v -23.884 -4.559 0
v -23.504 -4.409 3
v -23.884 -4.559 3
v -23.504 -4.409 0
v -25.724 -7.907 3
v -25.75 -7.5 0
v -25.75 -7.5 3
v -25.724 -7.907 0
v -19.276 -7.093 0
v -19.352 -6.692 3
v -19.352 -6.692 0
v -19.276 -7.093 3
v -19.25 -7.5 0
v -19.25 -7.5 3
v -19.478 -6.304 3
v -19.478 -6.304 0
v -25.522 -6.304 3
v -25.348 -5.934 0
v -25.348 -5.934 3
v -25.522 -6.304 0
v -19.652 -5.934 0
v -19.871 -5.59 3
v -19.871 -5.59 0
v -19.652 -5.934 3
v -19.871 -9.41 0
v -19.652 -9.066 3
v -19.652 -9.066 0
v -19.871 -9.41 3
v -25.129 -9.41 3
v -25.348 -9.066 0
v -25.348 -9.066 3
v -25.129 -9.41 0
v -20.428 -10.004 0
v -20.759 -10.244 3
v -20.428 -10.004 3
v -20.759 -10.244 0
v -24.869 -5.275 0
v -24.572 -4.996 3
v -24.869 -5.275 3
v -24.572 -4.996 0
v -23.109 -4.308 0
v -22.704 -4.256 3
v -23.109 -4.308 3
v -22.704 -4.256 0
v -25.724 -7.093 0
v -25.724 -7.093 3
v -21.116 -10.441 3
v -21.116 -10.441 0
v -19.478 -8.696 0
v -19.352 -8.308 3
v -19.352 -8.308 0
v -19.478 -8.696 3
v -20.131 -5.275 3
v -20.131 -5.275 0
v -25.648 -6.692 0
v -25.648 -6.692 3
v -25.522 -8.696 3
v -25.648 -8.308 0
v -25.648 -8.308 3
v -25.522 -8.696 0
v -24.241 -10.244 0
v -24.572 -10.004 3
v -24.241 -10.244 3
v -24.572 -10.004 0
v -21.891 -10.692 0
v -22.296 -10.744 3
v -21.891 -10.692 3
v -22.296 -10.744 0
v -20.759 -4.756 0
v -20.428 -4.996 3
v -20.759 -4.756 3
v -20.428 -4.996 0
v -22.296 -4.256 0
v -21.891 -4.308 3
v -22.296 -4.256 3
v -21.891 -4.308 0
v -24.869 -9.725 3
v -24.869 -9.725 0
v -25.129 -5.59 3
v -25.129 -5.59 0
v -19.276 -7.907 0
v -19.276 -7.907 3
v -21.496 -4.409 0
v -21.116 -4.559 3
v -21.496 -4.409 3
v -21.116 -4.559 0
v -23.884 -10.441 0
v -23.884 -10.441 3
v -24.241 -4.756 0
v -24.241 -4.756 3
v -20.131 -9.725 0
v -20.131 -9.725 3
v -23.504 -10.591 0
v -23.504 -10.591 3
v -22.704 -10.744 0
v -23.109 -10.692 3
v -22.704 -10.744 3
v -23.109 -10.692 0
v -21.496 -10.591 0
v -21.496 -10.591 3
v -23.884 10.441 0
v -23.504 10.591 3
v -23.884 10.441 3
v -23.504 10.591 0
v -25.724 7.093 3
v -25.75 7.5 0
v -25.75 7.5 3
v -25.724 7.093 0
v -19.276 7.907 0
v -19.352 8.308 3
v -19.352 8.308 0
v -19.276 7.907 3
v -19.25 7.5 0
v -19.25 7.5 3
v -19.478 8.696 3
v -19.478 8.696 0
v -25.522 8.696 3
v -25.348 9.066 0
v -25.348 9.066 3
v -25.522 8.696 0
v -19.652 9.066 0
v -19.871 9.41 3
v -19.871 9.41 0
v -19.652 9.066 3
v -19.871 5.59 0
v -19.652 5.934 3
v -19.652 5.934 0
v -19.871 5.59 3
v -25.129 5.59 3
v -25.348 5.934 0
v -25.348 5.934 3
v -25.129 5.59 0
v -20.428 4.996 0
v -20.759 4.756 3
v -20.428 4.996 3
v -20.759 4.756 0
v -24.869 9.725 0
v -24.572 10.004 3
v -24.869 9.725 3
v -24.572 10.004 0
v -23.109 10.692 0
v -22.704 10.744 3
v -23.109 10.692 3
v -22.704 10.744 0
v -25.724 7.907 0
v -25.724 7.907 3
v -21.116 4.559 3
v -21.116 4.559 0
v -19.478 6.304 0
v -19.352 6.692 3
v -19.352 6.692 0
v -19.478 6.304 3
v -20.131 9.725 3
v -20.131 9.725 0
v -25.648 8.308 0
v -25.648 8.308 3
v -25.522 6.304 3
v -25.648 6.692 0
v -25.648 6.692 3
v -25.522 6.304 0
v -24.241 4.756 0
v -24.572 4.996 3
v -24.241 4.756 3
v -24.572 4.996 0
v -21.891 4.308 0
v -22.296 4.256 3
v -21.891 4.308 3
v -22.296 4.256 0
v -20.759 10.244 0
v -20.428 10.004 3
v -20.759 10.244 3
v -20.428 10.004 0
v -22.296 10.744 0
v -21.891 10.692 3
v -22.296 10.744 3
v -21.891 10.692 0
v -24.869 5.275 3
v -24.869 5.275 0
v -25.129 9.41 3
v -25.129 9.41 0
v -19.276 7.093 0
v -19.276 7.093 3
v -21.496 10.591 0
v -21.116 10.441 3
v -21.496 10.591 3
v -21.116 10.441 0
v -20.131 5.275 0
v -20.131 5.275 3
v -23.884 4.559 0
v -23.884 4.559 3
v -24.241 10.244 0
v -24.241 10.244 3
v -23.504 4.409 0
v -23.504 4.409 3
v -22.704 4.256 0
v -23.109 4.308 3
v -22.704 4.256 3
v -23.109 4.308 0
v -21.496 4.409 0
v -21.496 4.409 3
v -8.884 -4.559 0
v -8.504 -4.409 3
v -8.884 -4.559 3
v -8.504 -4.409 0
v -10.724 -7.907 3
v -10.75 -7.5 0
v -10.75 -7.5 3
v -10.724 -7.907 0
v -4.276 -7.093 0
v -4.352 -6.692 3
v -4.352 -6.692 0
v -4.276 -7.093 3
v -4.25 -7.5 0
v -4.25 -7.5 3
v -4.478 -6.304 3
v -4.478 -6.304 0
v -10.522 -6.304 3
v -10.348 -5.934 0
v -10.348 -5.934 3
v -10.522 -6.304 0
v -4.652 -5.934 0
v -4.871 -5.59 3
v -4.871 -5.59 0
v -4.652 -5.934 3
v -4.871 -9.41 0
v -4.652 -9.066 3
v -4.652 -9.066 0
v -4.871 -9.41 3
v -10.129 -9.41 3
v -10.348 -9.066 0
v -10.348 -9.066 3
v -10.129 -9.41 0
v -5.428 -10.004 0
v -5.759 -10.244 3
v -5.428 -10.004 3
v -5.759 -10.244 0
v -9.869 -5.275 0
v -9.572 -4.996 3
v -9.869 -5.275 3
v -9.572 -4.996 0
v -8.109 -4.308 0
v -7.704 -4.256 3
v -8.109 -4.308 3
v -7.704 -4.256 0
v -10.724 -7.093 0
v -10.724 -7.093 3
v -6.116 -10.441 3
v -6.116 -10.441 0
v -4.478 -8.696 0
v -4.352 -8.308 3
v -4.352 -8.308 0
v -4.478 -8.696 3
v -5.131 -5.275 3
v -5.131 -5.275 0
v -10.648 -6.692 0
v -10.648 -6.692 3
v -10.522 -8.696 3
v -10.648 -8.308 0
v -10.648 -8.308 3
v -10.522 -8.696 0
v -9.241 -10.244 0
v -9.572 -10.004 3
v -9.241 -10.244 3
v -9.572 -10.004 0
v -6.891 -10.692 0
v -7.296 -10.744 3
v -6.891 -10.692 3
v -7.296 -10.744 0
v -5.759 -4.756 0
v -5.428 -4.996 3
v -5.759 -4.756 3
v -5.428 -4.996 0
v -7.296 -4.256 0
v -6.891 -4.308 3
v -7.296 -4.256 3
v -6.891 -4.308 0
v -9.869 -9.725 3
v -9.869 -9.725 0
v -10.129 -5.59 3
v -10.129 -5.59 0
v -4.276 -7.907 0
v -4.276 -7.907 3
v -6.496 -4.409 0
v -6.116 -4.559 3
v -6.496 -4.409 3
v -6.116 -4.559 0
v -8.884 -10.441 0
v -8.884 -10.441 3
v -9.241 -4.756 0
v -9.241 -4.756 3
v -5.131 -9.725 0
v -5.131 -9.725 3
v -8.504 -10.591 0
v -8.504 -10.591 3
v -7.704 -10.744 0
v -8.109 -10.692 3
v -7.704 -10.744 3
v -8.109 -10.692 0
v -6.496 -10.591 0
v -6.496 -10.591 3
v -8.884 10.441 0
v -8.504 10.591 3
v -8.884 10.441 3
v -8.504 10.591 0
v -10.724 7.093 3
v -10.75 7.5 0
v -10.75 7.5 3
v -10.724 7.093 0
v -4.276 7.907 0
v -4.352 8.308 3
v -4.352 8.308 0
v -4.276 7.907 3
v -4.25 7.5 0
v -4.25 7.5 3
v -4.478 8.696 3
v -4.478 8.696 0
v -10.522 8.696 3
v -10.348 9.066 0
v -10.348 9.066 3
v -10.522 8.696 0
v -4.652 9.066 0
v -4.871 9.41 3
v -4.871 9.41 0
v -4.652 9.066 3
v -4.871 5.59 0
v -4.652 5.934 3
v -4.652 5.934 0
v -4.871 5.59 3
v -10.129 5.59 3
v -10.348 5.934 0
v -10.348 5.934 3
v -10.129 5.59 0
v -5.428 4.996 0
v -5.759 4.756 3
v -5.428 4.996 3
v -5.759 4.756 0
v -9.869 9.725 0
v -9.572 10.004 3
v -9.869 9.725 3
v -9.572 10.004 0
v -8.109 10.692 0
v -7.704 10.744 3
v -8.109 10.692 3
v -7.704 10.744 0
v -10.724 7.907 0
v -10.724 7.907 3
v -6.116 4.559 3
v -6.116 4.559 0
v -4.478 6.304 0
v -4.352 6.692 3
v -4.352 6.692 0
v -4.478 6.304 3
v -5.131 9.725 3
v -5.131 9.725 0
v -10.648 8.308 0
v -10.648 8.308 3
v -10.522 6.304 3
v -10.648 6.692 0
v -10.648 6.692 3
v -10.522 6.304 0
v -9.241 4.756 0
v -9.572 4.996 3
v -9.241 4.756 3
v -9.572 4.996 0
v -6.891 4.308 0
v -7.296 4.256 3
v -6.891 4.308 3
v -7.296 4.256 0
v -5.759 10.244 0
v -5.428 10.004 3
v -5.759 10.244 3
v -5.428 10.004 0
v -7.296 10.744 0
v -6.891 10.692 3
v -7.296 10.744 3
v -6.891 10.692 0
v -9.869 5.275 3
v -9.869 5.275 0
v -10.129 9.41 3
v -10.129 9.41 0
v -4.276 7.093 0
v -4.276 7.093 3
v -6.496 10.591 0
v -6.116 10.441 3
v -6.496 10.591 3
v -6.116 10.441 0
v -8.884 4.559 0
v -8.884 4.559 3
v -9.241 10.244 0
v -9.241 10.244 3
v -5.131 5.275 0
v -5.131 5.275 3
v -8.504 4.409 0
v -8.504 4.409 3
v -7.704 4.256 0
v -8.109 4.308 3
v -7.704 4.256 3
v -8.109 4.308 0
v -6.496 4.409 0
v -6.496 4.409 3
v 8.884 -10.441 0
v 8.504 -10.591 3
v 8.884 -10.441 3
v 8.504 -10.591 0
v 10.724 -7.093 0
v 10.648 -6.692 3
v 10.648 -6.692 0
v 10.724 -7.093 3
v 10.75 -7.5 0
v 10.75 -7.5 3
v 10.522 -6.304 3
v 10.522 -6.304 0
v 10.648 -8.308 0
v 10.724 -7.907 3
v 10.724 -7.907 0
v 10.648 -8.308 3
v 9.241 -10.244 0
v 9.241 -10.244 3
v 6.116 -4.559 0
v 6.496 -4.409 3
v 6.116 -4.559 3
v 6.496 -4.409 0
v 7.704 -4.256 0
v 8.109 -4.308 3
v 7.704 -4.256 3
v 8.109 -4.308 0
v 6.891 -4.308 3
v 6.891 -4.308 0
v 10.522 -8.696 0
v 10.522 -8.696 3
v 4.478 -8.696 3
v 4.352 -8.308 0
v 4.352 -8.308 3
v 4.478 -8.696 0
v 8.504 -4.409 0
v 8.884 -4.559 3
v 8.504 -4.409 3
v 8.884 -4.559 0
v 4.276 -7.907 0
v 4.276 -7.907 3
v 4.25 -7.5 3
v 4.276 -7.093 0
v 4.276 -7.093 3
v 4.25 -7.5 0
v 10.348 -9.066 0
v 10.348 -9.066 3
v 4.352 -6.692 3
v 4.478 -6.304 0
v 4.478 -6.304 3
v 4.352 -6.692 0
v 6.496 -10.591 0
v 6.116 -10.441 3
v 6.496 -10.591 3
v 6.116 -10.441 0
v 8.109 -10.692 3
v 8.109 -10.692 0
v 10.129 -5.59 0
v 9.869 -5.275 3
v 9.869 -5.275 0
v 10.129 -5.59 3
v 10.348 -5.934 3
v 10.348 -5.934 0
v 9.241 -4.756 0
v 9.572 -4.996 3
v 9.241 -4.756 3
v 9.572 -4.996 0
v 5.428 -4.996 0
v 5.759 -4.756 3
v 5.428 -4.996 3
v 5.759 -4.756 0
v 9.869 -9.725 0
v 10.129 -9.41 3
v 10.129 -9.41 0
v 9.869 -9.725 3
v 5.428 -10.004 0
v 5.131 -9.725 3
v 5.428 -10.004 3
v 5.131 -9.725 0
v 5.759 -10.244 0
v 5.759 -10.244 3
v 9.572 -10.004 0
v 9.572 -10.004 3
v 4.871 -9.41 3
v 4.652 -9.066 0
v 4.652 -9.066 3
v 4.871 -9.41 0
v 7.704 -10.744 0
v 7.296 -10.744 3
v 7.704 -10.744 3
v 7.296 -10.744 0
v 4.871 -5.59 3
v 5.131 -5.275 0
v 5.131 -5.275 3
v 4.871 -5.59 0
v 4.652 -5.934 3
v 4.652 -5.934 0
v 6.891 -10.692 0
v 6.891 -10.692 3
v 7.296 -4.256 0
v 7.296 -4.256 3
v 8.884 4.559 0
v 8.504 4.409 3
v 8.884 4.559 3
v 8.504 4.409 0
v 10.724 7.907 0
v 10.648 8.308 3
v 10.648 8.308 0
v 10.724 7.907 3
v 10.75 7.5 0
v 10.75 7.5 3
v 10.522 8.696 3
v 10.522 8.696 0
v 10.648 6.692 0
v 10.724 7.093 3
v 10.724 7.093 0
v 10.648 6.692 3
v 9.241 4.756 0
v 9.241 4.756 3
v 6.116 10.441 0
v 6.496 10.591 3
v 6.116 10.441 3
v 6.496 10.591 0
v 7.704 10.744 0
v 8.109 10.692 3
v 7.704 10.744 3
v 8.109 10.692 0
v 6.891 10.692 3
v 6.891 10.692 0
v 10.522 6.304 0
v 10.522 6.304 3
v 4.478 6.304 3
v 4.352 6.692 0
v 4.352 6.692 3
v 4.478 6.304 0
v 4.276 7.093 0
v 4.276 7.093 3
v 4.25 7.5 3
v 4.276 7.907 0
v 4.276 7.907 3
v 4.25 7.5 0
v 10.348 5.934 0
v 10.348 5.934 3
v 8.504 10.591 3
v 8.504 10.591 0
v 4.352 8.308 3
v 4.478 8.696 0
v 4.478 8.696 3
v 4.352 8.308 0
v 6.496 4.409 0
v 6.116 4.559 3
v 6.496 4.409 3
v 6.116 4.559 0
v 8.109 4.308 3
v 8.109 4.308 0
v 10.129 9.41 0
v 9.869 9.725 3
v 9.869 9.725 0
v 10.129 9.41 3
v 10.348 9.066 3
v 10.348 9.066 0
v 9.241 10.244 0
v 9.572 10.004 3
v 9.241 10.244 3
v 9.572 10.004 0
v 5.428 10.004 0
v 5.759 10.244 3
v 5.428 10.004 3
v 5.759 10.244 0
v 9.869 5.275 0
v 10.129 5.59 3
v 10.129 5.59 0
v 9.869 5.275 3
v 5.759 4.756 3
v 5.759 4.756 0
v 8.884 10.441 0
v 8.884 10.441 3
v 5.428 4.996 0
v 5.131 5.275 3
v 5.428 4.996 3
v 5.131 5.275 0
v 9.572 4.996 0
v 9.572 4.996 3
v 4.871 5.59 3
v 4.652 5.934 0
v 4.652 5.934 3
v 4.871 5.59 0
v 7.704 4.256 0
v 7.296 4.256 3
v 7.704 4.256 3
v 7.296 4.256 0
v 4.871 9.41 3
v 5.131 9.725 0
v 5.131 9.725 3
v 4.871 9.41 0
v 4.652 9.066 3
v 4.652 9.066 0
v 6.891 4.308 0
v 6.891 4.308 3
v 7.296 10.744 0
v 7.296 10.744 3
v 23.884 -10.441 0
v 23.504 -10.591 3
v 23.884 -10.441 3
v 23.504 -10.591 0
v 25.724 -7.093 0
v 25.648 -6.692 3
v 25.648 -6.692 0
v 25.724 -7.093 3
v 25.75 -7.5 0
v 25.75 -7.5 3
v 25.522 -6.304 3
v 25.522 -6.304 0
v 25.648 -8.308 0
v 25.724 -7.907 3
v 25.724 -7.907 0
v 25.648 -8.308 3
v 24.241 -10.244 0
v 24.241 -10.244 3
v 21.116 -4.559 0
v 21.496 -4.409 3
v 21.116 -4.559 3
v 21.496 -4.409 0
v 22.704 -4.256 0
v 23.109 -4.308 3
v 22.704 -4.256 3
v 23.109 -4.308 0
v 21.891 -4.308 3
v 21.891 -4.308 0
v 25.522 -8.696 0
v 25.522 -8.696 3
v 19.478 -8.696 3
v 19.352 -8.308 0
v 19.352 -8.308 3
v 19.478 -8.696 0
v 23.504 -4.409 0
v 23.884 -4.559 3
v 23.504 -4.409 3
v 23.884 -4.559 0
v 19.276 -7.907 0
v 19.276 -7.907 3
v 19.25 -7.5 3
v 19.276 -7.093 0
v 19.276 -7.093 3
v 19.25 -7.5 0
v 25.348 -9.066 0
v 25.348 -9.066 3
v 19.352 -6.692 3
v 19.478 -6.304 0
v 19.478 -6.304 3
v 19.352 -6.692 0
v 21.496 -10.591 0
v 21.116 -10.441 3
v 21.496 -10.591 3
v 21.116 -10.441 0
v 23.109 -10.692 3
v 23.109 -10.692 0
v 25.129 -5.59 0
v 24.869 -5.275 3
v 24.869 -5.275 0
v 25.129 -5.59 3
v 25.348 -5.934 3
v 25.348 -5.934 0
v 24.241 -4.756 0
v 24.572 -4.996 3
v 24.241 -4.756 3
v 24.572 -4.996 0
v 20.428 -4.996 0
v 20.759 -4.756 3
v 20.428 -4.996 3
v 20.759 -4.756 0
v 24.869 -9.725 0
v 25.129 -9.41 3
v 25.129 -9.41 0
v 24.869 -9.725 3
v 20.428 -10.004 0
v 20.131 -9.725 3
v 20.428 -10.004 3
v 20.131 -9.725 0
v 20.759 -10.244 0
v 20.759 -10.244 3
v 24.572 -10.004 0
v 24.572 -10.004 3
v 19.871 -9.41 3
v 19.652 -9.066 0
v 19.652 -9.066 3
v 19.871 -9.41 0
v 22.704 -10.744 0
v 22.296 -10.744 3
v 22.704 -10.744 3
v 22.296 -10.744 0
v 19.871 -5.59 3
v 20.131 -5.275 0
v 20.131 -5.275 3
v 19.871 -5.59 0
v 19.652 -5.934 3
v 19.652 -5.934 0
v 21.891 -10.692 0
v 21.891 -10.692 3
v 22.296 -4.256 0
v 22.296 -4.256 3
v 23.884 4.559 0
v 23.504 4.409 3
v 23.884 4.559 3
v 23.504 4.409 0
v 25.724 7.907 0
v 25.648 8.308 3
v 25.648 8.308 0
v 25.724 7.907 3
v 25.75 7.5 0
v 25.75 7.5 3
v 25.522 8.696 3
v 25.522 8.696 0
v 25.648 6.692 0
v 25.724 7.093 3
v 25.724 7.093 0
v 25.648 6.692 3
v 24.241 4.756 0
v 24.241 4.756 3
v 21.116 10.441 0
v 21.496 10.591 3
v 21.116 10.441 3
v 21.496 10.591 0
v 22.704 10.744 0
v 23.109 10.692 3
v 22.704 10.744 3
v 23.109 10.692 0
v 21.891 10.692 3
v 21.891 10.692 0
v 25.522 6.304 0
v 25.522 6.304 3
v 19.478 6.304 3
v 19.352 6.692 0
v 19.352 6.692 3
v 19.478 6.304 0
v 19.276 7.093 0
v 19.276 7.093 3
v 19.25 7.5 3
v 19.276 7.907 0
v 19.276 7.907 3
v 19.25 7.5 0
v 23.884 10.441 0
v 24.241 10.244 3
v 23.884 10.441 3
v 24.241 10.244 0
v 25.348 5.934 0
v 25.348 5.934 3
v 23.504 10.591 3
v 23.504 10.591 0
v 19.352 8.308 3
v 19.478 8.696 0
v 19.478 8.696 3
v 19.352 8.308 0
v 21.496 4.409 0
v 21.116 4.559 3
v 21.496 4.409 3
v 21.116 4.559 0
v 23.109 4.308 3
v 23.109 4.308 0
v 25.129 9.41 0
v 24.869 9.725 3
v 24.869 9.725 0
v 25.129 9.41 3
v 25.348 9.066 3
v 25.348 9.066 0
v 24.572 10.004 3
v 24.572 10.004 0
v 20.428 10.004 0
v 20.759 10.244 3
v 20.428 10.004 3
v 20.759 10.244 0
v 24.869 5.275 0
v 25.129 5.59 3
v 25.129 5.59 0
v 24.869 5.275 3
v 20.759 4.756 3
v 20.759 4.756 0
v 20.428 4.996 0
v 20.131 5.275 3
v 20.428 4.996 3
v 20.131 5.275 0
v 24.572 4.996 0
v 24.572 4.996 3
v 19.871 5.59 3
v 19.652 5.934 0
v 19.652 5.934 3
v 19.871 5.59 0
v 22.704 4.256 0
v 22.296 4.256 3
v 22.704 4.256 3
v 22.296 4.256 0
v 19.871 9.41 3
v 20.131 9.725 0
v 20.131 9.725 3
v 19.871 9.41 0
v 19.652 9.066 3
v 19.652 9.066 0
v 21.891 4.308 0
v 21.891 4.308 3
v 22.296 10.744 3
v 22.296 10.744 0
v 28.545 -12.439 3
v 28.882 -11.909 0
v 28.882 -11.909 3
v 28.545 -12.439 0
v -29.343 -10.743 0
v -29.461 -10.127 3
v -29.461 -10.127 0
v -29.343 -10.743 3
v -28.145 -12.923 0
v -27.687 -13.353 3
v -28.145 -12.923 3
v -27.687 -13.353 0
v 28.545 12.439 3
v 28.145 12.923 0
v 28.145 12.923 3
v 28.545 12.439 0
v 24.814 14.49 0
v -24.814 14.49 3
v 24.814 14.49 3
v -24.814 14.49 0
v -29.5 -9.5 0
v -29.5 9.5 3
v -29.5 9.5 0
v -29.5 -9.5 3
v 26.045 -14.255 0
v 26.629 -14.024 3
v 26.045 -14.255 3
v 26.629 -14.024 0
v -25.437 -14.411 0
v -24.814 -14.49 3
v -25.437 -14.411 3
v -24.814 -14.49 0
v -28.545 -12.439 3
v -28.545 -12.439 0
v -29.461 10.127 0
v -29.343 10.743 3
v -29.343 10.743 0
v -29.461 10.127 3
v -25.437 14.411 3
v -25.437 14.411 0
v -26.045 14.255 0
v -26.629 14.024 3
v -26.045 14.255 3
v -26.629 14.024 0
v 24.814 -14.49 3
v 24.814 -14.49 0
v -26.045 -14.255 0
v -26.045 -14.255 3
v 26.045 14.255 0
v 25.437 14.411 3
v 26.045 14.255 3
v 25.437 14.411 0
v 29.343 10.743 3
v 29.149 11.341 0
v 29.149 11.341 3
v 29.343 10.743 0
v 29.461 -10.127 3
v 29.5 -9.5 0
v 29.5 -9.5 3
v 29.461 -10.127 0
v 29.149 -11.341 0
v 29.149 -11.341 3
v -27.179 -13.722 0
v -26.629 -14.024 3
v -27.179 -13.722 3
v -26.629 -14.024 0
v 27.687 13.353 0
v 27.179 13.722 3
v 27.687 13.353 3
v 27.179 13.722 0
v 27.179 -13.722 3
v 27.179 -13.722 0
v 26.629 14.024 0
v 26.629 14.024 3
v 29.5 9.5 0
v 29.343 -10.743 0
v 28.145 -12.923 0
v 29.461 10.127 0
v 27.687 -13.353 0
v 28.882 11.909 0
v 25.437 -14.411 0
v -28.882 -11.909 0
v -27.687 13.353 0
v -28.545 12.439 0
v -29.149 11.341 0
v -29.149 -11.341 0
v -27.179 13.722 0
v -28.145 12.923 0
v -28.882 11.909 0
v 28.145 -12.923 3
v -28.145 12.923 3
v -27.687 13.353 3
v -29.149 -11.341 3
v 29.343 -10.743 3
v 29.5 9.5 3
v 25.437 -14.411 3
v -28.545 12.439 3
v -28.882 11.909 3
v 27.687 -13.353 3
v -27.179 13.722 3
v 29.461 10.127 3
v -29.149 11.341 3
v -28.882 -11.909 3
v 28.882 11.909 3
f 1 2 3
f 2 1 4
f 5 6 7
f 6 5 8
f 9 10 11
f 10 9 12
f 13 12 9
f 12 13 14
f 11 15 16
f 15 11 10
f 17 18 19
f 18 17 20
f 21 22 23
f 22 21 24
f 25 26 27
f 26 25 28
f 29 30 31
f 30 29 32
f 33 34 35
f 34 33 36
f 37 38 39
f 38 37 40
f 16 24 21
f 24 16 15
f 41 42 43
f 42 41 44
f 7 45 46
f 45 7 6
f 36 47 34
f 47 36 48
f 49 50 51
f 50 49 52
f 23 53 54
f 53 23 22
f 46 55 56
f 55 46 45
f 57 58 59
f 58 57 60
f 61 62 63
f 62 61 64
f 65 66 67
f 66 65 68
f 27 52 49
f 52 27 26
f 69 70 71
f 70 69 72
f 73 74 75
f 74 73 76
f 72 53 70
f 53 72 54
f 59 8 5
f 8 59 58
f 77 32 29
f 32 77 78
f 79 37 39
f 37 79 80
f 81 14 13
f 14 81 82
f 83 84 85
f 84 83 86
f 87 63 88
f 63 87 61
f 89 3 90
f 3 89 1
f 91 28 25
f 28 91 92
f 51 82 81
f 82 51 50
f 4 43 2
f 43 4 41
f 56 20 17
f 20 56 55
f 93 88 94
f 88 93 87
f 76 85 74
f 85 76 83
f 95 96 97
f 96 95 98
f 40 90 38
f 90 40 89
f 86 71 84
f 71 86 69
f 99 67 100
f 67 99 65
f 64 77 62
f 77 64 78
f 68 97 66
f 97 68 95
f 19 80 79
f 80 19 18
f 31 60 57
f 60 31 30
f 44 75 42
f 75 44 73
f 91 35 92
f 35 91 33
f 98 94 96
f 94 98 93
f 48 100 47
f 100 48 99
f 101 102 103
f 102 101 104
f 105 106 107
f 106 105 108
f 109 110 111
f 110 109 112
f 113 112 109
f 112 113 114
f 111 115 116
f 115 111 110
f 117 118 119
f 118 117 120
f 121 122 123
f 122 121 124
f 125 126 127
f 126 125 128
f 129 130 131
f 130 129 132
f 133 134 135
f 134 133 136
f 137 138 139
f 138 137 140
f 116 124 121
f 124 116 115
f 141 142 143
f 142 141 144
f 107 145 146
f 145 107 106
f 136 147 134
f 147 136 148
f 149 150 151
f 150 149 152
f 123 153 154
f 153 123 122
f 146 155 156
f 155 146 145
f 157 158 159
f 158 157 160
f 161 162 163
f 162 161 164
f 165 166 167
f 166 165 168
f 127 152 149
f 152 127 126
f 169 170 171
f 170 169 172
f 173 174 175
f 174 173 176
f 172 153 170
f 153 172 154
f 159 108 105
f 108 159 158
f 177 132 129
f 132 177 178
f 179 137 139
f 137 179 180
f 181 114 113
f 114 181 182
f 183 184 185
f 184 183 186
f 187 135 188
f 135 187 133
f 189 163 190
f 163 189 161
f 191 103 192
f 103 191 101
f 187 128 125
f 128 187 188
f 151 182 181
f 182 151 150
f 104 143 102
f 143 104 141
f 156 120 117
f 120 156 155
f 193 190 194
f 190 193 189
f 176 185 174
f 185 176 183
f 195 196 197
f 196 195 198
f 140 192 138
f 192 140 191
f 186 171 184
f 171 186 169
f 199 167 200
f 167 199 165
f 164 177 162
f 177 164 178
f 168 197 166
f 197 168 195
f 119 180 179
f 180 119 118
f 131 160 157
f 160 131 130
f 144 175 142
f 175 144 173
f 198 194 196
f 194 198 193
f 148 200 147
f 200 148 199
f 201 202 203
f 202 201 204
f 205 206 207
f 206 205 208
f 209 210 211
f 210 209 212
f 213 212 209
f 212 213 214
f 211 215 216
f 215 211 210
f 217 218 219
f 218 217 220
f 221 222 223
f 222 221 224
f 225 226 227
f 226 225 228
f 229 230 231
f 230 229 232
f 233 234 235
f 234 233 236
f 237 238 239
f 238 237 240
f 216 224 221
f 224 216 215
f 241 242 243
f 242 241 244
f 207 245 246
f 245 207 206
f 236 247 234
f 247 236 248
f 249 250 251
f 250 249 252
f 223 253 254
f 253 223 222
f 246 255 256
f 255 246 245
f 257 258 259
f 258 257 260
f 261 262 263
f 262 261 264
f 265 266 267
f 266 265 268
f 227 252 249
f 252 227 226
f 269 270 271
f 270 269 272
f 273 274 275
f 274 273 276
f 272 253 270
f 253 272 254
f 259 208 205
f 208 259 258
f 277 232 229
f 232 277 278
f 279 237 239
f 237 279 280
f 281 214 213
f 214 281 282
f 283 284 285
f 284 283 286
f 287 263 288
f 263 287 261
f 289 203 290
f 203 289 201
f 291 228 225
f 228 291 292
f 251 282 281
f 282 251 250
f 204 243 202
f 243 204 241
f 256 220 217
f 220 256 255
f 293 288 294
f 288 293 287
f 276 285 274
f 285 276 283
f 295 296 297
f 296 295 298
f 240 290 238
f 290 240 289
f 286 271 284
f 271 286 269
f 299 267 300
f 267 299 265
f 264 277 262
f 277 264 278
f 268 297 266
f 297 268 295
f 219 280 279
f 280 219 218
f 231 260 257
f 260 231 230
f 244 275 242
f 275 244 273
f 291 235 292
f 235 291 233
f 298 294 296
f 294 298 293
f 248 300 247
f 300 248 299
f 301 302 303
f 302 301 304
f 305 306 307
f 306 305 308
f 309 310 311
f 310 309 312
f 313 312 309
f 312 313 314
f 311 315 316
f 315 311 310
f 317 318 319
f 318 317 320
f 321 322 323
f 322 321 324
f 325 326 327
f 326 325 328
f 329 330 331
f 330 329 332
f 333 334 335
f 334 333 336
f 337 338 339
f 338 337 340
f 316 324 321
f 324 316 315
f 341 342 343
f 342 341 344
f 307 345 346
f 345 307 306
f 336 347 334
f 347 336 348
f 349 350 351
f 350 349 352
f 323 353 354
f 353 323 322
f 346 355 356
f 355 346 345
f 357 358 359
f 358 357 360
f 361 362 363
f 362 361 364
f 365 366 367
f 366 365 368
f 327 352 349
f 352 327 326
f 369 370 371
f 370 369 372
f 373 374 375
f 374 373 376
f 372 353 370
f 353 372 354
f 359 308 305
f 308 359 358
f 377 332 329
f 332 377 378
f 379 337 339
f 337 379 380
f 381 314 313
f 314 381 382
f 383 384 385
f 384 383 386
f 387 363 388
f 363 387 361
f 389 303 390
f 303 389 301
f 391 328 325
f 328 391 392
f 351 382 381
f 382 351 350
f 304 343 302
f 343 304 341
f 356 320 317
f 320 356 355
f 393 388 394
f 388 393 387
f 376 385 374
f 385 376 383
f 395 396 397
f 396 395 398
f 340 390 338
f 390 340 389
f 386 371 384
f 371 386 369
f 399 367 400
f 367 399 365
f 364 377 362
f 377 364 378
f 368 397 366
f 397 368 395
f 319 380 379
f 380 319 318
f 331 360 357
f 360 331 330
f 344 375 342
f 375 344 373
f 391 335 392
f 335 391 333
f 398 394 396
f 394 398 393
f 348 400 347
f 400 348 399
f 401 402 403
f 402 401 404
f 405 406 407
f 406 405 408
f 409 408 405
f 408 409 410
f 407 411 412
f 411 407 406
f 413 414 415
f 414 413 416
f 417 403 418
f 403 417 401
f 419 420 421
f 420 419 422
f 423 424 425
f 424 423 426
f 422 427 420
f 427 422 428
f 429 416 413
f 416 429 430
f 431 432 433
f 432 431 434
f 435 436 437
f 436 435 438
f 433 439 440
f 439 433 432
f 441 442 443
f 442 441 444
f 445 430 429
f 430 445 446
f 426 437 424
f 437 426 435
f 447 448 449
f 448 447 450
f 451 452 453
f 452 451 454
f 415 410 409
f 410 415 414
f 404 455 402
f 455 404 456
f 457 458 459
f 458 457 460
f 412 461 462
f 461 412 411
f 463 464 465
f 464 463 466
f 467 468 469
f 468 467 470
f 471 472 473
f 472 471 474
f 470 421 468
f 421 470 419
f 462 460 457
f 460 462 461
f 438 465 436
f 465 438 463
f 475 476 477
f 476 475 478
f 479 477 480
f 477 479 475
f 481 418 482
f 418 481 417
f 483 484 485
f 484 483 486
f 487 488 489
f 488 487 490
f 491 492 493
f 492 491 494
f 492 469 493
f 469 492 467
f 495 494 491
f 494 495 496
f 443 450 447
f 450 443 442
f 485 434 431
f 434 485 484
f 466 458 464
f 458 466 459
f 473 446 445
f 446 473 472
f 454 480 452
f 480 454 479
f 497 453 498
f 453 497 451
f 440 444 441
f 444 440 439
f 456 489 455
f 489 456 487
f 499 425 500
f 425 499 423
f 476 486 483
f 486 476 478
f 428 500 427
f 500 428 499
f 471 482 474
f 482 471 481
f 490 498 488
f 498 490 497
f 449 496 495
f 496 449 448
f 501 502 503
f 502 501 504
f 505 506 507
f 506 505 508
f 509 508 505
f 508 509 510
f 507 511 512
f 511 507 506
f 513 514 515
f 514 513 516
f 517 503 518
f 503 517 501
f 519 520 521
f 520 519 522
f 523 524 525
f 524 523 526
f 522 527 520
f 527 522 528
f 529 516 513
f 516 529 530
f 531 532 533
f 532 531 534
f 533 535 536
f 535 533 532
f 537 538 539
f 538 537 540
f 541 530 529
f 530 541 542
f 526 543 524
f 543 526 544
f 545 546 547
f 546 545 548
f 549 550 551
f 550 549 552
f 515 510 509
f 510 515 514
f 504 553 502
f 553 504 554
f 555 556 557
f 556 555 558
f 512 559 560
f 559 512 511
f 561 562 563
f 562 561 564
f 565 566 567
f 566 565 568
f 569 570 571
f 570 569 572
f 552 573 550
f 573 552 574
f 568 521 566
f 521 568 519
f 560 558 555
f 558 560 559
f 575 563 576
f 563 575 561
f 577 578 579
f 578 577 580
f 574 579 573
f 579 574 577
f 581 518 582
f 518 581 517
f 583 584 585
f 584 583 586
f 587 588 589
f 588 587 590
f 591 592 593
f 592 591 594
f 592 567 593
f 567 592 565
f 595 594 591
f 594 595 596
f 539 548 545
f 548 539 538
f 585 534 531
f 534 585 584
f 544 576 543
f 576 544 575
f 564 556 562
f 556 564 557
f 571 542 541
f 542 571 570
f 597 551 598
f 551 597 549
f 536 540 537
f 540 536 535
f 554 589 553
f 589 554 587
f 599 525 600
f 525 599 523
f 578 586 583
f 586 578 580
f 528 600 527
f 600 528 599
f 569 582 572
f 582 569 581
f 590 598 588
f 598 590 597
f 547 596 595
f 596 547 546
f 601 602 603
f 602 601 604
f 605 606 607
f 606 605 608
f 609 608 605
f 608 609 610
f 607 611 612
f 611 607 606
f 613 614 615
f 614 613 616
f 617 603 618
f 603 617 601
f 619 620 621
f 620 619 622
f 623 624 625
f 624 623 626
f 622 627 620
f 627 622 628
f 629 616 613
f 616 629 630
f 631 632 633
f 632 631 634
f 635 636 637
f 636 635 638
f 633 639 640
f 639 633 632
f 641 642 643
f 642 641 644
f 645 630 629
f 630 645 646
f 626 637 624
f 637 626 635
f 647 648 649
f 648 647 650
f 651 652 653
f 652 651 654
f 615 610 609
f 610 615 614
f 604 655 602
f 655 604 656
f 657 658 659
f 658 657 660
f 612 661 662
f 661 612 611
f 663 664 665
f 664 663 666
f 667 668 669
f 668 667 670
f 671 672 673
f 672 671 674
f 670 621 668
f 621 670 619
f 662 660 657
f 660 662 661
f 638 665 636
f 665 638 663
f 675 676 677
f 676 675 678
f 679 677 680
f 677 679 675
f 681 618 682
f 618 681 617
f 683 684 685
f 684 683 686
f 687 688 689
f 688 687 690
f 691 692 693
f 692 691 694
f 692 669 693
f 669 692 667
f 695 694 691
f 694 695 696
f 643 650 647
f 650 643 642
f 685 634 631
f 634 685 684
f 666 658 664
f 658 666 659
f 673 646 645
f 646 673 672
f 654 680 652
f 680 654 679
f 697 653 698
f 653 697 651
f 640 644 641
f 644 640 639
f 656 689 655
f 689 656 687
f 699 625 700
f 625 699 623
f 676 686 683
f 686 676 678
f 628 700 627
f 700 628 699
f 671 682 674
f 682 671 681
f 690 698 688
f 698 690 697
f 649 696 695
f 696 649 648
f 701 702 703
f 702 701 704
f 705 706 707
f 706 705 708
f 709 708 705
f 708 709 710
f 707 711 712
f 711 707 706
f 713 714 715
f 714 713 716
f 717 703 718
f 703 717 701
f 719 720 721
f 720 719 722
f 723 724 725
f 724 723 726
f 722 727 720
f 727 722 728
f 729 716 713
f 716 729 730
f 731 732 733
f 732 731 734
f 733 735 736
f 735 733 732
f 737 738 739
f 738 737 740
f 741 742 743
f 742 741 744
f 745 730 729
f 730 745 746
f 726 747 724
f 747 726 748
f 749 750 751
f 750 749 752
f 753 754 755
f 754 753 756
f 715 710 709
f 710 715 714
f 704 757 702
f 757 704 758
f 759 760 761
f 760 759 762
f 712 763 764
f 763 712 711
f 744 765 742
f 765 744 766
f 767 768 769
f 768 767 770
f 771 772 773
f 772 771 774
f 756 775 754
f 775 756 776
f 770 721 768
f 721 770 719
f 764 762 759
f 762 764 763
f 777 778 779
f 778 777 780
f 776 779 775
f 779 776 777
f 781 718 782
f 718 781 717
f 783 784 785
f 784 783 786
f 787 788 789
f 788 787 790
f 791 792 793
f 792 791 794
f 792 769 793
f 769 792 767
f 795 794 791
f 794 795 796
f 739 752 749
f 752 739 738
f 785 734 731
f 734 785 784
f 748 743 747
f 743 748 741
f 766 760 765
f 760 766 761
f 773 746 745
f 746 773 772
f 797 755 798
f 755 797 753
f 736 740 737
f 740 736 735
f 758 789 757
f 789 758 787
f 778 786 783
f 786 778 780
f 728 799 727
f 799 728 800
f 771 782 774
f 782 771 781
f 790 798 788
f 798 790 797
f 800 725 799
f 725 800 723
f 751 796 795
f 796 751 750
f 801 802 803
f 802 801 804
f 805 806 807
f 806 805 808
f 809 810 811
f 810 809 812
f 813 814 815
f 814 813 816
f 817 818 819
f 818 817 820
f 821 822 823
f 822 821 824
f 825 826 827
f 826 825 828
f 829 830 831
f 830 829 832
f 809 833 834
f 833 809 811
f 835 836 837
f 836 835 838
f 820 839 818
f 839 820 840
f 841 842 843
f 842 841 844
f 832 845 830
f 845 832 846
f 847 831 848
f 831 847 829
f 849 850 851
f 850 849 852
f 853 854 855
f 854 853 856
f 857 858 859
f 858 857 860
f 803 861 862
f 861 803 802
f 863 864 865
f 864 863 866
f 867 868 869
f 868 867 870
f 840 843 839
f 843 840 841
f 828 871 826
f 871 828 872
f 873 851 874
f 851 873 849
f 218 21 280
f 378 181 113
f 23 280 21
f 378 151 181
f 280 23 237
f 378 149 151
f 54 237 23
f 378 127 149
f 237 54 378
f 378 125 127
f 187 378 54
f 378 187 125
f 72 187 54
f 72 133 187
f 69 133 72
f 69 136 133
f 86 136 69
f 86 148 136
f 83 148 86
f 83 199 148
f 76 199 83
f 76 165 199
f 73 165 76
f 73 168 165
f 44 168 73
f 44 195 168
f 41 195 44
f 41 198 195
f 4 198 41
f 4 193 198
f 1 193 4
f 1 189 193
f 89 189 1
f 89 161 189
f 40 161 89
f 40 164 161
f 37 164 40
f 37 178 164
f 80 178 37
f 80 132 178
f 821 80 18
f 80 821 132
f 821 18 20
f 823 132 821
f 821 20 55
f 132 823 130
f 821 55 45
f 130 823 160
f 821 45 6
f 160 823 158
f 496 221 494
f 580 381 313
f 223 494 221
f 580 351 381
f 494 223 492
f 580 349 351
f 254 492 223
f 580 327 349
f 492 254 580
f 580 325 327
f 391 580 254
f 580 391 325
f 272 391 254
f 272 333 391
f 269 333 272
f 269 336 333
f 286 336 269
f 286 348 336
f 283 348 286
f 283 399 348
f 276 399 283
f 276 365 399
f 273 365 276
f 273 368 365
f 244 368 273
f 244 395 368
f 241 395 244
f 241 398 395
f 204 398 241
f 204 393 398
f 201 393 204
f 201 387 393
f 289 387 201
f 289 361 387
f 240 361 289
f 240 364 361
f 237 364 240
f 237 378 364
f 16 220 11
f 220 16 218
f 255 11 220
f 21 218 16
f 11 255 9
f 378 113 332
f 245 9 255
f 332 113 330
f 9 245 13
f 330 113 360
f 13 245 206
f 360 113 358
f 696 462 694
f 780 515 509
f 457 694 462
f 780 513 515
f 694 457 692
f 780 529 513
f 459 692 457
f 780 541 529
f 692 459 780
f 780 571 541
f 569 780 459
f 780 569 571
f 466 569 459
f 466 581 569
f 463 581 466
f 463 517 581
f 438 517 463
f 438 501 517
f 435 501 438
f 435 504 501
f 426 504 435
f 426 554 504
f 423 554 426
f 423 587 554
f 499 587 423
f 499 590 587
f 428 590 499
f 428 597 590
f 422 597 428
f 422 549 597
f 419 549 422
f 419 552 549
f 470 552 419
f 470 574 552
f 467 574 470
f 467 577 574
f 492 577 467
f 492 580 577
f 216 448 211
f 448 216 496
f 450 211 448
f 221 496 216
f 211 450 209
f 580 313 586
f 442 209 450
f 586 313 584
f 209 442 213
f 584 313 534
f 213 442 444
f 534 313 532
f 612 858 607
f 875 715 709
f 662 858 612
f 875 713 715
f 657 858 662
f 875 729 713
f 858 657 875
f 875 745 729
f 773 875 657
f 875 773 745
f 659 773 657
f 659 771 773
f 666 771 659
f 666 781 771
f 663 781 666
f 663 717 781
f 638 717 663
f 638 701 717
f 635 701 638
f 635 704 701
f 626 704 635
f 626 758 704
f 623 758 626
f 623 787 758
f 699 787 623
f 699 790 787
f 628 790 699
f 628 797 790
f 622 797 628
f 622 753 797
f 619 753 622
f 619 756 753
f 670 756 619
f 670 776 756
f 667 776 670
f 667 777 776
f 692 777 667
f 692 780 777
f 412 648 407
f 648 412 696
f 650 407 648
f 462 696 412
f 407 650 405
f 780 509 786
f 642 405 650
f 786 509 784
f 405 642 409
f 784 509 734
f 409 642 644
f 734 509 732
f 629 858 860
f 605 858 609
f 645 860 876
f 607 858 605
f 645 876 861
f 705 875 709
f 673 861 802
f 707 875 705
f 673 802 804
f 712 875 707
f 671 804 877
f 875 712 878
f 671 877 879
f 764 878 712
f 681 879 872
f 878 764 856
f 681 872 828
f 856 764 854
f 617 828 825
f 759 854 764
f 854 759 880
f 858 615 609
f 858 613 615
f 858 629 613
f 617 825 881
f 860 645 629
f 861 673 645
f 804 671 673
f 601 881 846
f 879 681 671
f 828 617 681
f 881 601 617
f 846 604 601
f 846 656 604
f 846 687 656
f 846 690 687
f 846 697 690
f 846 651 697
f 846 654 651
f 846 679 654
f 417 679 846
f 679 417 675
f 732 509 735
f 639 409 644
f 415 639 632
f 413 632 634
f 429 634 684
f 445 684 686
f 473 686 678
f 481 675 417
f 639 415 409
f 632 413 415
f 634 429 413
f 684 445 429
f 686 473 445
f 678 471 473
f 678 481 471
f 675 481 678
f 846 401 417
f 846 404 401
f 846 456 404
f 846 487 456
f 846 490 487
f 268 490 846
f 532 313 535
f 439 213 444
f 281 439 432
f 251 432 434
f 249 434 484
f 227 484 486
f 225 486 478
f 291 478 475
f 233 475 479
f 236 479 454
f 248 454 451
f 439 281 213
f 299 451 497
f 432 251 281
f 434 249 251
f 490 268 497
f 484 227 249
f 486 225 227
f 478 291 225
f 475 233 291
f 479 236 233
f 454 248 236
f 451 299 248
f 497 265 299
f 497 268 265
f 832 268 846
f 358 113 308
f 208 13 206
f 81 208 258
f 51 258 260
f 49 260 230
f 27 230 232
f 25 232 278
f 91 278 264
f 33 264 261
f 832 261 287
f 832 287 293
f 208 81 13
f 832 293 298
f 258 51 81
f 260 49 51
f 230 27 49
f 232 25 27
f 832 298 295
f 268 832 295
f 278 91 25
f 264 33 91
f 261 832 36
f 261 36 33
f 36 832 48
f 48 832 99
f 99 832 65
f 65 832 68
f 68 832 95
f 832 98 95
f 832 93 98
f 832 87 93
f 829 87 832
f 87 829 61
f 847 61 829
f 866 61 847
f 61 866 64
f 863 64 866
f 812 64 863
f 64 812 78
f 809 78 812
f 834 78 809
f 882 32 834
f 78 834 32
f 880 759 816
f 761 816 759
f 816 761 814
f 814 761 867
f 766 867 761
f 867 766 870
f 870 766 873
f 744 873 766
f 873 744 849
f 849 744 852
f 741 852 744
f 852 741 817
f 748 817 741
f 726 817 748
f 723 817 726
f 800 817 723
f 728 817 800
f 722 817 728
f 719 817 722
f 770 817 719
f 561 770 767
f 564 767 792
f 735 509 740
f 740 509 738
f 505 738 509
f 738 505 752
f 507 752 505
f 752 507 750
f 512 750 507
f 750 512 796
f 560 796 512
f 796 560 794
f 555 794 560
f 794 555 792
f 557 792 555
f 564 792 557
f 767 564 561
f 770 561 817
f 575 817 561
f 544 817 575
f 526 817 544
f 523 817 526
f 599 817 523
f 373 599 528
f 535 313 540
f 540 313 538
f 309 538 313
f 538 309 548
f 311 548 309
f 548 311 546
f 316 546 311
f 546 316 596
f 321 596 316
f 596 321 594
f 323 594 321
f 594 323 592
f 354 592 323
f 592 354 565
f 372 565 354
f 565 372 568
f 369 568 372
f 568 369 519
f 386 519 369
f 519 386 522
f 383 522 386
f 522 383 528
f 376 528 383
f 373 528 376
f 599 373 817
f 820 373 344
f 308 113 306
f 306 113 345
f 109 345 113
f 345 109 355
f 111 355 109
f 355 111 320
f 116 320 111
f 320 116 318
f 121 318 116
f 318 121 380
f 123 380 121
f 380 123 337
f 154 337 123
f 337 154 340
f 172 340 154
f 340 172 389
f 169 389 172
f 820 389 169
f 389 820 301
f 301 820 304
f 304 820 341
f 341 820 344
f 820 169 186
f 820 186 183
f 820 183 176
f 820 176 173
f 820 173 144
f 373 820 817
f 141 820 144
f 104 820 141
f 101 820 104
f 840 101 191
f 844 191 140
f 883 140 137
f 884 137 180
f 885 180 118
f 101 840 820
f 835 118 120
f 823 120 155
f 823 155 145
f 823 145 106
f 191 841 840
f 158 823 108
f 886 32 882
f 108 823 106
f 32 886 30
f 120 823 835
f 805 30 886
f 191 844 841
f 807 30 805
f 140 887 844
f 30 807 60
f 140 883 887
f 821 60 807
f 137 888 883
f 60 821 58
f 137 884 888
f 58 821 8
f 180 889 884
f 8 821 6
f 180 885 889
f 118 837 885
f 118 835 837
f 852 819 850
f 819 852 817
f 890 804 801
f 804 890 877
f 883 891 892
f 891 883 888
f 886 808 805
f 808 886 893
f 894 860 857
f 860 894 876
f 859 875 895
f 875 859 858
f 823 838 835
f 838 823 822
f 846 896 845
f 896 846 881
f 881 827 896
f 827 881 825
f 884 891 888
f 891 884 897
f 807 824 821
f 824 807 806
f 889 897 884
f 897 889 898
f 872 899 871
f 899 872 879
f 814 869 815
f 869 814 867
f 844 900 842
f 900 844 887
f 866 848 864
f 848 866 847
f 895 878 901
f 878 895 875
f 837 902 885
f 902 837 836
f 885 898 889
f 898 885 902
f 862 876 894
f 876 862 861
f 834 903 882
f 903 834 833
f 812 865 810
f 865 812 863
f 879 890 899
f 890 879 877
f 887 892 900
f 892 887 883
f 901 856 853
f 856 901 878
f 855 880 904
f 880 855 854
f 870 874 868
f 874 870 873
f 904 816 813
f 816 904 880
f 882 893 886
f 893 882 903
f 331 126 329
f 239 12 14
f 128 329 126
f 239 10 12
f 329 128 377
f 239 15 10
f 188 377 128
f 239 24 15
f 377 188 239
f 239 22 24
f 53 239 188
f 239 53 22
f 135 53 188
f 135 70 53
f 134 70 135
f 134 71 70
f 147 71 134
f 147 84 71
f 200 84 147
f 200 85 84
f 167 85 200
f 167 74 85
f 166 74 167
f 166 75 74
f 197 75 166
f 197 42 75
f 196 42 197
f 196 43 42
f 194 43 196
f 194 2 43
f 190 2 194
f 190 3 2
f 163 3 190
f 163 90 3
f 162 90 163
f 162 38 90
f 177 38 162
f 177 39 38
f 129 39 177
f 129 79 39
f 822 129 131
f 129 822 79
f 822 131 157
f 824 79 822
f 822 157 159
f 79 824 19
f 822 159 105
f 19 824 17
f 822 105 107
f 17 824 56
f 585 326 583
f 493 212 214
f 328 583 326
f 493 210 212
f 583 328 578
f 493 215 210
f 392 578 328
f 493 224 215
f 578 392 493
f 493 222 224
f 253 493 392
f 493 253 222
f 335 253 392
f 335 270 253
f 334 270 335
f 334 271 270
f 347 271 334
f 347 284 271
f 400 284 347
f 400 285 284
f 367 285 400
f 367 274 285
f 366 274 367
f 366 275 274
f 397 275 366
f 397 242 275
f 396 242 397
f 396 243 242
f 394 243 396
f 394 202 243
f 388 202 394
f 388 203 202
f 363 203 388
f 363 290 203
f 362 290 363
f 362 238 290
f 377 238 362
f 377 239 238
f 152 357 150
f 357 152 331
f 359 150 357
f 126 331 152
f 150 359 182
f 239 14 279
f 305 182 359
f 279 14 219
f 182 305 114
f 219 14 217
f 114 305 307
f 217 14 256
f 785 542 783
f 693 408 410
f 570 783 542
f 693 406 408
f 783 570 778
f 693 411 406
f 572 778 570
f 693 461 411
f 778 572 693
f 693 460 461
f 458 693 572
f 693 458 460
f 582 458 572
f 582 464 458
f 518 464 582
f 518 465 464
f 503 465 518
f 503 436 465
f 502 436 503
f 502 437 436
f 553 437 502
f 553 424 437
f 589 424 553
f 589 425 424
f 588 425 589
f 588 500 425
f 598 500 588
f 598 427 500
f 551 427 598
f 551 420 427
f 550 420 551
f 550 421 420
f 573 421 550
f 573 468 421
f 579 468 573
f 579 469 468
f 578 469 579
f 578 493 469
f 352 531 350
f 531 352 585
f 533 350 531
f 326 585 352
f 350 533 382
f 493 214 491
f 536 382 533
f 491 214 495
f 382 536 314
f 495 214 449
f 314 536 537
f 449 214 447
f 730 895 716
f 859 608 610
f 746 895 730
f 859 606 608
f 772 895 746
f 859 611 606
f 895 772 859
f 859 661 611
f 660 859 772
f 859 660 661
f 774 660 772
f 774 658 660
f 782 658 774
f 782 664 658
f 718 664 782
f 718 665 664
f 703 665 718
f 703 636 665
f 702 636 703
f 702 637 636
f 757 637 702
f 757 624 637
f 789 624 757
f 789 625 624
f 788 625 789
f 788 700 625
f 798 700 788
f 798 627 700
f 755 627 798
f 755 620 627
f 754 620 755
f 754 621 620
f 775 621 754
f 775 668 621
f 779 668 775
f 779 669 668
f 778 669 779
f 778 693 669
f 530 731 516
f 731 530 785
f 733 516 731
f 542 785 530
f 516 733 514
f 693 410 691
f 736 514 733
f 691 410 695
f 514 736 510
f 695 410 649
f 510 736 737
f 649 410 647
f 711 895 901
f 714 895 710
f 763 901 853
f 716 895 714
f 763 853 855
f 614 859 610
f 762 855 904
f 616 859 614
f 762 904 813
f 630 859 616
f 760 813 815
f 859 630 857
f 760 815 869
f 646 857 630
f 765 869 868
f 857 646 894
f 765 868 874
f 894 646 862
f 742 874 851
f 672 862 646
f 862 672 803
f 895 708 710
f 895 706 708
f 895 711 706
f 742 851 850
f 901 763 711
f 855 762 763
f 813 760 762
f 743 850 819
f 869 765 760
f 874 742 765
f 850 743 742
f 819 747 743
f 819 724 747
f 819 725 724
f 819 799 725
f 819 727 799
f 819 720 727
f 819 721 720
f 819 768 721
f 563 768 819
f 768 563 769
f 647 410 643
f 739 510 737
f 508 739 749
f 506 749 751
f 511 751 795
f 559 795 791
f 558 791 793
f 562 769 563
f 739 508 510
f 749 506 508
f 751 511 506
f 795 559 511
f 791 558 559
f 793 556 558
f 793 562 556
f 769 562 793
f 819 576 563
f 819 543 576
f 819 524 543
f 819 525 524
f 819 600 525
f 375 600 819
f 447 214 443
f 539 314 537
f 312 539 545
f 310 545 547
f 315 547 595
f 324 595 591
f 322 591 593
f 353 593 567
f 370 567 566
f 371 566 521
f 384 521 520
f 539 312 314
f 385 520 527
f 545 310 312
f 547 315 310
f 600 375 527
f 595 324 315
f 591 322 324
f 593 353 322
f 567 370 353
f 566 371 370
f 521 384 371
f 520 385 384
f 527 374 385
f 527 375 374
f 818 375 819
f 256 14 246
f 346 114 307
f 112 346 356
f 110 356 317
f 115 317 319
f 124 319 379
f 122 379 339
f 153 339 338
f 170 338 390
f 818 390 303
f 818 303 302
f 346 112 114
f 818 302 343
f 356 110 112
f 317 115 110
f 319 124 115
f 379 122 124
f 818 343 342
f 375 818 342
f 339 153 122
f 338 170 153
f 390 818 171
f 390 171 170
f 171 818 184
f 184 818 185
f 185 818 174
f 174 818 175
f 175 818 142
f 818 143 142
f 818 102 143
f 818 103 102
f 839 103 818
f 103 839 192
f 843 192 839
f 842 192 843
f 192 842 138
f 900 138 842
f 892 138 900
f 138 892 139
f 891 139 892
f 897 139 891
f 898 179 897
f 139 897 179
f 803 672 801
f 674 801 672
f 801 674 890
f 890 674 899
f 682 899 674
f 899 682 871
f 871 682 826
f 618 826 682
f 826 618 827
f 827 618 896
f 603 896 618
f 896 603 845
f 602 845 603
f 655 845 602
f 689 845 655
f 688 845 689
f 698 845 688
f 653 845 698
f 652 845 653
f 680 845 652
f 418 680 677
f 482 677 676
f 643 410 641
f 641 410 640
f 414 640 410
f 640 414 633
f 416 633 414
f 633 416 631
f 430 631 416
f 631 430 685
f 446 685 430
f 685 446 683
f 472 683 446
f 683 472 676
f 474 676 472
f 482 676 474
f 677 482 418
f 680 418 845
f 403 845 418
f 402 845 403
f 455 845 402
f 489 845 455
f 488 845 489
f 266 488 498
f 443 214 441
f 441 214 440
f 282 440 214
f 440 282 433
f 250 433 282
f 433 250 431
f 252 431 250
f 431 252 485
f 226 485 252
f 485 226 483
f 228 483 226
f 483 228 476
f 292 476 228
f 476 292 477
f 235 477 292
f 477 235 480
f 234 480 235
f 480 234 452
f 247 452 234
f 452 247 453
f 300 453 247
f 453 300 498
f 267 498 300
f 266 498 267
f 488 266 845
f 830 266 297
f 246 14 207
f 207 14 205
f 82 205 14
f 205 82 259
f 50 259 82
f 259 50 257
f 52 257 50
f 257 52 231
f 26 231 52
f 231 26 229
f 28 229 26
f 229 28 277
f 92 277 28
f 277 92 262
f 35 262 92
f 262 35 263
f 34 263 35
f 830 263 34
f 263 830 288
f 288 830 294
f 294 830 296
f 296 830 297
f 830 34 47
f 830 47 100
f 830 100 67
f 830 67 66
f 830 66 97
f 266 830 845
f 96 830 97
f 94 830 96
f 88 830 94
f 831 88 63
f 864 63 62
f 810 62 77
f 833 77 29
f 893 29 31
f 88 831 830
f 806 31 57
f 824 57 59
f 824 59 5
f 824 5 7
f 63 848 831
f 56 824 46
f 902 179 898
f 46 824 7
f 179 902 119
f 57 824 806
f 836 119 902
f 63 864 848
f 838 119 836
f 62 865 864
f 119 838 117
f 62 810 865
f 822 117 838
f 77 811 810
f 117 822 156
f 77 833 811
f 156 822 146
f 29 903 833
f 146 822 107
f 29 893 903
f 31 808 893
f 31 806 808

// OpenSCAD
$fn = 50;


difference() {
	union() {
		translate(v = [0, 0, 0]) {
			rotate(a = [0, 0, 0]) {
				hull() {
					translate(v = [-24.5000000000, 9.5000000000, 0]) {
						rotate(a = [0, 0, 0]) {
							translate(v = [0, 0, 0]) {
								rotate(a = [0, 0, 0]) {
									cylinder(h = 3, r = 5);
								}
							}
						}
					}
					translate(v = [24.5000000000, 9.5000000000, 0]) {
						rotate(a = [0, 0, 0]) {
							translate(v = [0, 0, 0]) {
								rotate(a = [0, 0, 0]) {
									cylinder(h = 3, r = 5);
								}
							}
						}
					}
					translate(v = [-24.5000000000, -9.5000000000, 0]) {
						rotate(a = [0, 0, 0]) {
							translate(v = [0, 0, 0]) {
								rotate(a = [0, 0, 0]) {
									cylinder(h = 3, r = 5);
								}
							}
						}
					}
					translate(v = [24.5000000000, -9.5000000000, 0]) {
						rotate(a = [0, 0, 0]) {
							translate(v = [0, 0, 0]) {
								rotate(a = [0, 0, 0]) {
									cylinder(h = 3, r = 5);
								}
							}
						}
					}
				}
			}
		}
	}
	union() {
		translate(v = [-22.5000000000, -7.5000000000, 0]) {
			rotate(a = [0, 0, 0]) {
				translate(v = [0, 0, -50]) {
					rotate(a = [0, 0, 0]) {
						cylinder(h = 100, r = 3.2500000000);
					}
				}
			}
		}
		translate(v = [-22.5000000000, 7.5000000000, 0]) {
			rotate(a = [0, 0, 0]) {
				translate(v = [0, 0, -50]) {
					rotate(a = [0, 0, 0]) {
						cylinder(h = 100, r = 3.2500000000);
					}
				}
			}
		}
		translate(v = [-7.5000000000, -7.5000000000, 0]) {
			rotate(a = [0, 0, 0]) {
				translate(v = [0, 0, -50]) {
					rotate(a = [0, 0, 0]) {
						cylinder(h = 100, r = 3.2500000000);
					}
				}
			}
		}
		translate(v = [-7.5000000000, 7.5000000000, 0]) {
			rotate(a = [0, 0, 0]) {
				translate(v = [0, 0, -50]) {
					rotate(a = [0, 0, 0]) {
						cylinder(h = 100, r = 3.2500000000);
					}
				}
			}
		}
		translate(v = [7.5000000000, -7.5000000000, 0]) {
			rotate(a = [0, 0, 0]) {
				translate(v = [0, 0, -50]) {
					rotate(a = [0, 0, 0]) {
						cylinder(h = 100, r = 3.2500000000);
					}
				}
			}
		}
		translate(v = [7.5000000000, 7.5000000000, 0]) {
			rotate(a = [0, 0, 0]) {
				translate(v = [0, 0, -50]) {
					rotate(a = [0, 0, 0]) {
						cylinder(h = 100, r = 3.2500000000);
					}
				}
			}
		}
		translate(v = [22.5000000000, -7.5000000000, 0]) {
			rotate(a = [0, 0, 0]) {
				translate(v = [0, 0, -50]) {
					rotate(a = [0, 0, 0]) {
						cylinder(h = 100, r = 3.2500000000);
					}
				}
			}
		}
		translate(v = [22.5000000000, 7.5000000000, 0]) {
			rotate(a = [0, 0, 0]) {
				translate(v = [0, 0, -50]) {
					rotate(a = [0, 0, 0]) {
						cylinder(h = 100, r = 3.2500000000);
					}
				}
			}
		}
	}
}
